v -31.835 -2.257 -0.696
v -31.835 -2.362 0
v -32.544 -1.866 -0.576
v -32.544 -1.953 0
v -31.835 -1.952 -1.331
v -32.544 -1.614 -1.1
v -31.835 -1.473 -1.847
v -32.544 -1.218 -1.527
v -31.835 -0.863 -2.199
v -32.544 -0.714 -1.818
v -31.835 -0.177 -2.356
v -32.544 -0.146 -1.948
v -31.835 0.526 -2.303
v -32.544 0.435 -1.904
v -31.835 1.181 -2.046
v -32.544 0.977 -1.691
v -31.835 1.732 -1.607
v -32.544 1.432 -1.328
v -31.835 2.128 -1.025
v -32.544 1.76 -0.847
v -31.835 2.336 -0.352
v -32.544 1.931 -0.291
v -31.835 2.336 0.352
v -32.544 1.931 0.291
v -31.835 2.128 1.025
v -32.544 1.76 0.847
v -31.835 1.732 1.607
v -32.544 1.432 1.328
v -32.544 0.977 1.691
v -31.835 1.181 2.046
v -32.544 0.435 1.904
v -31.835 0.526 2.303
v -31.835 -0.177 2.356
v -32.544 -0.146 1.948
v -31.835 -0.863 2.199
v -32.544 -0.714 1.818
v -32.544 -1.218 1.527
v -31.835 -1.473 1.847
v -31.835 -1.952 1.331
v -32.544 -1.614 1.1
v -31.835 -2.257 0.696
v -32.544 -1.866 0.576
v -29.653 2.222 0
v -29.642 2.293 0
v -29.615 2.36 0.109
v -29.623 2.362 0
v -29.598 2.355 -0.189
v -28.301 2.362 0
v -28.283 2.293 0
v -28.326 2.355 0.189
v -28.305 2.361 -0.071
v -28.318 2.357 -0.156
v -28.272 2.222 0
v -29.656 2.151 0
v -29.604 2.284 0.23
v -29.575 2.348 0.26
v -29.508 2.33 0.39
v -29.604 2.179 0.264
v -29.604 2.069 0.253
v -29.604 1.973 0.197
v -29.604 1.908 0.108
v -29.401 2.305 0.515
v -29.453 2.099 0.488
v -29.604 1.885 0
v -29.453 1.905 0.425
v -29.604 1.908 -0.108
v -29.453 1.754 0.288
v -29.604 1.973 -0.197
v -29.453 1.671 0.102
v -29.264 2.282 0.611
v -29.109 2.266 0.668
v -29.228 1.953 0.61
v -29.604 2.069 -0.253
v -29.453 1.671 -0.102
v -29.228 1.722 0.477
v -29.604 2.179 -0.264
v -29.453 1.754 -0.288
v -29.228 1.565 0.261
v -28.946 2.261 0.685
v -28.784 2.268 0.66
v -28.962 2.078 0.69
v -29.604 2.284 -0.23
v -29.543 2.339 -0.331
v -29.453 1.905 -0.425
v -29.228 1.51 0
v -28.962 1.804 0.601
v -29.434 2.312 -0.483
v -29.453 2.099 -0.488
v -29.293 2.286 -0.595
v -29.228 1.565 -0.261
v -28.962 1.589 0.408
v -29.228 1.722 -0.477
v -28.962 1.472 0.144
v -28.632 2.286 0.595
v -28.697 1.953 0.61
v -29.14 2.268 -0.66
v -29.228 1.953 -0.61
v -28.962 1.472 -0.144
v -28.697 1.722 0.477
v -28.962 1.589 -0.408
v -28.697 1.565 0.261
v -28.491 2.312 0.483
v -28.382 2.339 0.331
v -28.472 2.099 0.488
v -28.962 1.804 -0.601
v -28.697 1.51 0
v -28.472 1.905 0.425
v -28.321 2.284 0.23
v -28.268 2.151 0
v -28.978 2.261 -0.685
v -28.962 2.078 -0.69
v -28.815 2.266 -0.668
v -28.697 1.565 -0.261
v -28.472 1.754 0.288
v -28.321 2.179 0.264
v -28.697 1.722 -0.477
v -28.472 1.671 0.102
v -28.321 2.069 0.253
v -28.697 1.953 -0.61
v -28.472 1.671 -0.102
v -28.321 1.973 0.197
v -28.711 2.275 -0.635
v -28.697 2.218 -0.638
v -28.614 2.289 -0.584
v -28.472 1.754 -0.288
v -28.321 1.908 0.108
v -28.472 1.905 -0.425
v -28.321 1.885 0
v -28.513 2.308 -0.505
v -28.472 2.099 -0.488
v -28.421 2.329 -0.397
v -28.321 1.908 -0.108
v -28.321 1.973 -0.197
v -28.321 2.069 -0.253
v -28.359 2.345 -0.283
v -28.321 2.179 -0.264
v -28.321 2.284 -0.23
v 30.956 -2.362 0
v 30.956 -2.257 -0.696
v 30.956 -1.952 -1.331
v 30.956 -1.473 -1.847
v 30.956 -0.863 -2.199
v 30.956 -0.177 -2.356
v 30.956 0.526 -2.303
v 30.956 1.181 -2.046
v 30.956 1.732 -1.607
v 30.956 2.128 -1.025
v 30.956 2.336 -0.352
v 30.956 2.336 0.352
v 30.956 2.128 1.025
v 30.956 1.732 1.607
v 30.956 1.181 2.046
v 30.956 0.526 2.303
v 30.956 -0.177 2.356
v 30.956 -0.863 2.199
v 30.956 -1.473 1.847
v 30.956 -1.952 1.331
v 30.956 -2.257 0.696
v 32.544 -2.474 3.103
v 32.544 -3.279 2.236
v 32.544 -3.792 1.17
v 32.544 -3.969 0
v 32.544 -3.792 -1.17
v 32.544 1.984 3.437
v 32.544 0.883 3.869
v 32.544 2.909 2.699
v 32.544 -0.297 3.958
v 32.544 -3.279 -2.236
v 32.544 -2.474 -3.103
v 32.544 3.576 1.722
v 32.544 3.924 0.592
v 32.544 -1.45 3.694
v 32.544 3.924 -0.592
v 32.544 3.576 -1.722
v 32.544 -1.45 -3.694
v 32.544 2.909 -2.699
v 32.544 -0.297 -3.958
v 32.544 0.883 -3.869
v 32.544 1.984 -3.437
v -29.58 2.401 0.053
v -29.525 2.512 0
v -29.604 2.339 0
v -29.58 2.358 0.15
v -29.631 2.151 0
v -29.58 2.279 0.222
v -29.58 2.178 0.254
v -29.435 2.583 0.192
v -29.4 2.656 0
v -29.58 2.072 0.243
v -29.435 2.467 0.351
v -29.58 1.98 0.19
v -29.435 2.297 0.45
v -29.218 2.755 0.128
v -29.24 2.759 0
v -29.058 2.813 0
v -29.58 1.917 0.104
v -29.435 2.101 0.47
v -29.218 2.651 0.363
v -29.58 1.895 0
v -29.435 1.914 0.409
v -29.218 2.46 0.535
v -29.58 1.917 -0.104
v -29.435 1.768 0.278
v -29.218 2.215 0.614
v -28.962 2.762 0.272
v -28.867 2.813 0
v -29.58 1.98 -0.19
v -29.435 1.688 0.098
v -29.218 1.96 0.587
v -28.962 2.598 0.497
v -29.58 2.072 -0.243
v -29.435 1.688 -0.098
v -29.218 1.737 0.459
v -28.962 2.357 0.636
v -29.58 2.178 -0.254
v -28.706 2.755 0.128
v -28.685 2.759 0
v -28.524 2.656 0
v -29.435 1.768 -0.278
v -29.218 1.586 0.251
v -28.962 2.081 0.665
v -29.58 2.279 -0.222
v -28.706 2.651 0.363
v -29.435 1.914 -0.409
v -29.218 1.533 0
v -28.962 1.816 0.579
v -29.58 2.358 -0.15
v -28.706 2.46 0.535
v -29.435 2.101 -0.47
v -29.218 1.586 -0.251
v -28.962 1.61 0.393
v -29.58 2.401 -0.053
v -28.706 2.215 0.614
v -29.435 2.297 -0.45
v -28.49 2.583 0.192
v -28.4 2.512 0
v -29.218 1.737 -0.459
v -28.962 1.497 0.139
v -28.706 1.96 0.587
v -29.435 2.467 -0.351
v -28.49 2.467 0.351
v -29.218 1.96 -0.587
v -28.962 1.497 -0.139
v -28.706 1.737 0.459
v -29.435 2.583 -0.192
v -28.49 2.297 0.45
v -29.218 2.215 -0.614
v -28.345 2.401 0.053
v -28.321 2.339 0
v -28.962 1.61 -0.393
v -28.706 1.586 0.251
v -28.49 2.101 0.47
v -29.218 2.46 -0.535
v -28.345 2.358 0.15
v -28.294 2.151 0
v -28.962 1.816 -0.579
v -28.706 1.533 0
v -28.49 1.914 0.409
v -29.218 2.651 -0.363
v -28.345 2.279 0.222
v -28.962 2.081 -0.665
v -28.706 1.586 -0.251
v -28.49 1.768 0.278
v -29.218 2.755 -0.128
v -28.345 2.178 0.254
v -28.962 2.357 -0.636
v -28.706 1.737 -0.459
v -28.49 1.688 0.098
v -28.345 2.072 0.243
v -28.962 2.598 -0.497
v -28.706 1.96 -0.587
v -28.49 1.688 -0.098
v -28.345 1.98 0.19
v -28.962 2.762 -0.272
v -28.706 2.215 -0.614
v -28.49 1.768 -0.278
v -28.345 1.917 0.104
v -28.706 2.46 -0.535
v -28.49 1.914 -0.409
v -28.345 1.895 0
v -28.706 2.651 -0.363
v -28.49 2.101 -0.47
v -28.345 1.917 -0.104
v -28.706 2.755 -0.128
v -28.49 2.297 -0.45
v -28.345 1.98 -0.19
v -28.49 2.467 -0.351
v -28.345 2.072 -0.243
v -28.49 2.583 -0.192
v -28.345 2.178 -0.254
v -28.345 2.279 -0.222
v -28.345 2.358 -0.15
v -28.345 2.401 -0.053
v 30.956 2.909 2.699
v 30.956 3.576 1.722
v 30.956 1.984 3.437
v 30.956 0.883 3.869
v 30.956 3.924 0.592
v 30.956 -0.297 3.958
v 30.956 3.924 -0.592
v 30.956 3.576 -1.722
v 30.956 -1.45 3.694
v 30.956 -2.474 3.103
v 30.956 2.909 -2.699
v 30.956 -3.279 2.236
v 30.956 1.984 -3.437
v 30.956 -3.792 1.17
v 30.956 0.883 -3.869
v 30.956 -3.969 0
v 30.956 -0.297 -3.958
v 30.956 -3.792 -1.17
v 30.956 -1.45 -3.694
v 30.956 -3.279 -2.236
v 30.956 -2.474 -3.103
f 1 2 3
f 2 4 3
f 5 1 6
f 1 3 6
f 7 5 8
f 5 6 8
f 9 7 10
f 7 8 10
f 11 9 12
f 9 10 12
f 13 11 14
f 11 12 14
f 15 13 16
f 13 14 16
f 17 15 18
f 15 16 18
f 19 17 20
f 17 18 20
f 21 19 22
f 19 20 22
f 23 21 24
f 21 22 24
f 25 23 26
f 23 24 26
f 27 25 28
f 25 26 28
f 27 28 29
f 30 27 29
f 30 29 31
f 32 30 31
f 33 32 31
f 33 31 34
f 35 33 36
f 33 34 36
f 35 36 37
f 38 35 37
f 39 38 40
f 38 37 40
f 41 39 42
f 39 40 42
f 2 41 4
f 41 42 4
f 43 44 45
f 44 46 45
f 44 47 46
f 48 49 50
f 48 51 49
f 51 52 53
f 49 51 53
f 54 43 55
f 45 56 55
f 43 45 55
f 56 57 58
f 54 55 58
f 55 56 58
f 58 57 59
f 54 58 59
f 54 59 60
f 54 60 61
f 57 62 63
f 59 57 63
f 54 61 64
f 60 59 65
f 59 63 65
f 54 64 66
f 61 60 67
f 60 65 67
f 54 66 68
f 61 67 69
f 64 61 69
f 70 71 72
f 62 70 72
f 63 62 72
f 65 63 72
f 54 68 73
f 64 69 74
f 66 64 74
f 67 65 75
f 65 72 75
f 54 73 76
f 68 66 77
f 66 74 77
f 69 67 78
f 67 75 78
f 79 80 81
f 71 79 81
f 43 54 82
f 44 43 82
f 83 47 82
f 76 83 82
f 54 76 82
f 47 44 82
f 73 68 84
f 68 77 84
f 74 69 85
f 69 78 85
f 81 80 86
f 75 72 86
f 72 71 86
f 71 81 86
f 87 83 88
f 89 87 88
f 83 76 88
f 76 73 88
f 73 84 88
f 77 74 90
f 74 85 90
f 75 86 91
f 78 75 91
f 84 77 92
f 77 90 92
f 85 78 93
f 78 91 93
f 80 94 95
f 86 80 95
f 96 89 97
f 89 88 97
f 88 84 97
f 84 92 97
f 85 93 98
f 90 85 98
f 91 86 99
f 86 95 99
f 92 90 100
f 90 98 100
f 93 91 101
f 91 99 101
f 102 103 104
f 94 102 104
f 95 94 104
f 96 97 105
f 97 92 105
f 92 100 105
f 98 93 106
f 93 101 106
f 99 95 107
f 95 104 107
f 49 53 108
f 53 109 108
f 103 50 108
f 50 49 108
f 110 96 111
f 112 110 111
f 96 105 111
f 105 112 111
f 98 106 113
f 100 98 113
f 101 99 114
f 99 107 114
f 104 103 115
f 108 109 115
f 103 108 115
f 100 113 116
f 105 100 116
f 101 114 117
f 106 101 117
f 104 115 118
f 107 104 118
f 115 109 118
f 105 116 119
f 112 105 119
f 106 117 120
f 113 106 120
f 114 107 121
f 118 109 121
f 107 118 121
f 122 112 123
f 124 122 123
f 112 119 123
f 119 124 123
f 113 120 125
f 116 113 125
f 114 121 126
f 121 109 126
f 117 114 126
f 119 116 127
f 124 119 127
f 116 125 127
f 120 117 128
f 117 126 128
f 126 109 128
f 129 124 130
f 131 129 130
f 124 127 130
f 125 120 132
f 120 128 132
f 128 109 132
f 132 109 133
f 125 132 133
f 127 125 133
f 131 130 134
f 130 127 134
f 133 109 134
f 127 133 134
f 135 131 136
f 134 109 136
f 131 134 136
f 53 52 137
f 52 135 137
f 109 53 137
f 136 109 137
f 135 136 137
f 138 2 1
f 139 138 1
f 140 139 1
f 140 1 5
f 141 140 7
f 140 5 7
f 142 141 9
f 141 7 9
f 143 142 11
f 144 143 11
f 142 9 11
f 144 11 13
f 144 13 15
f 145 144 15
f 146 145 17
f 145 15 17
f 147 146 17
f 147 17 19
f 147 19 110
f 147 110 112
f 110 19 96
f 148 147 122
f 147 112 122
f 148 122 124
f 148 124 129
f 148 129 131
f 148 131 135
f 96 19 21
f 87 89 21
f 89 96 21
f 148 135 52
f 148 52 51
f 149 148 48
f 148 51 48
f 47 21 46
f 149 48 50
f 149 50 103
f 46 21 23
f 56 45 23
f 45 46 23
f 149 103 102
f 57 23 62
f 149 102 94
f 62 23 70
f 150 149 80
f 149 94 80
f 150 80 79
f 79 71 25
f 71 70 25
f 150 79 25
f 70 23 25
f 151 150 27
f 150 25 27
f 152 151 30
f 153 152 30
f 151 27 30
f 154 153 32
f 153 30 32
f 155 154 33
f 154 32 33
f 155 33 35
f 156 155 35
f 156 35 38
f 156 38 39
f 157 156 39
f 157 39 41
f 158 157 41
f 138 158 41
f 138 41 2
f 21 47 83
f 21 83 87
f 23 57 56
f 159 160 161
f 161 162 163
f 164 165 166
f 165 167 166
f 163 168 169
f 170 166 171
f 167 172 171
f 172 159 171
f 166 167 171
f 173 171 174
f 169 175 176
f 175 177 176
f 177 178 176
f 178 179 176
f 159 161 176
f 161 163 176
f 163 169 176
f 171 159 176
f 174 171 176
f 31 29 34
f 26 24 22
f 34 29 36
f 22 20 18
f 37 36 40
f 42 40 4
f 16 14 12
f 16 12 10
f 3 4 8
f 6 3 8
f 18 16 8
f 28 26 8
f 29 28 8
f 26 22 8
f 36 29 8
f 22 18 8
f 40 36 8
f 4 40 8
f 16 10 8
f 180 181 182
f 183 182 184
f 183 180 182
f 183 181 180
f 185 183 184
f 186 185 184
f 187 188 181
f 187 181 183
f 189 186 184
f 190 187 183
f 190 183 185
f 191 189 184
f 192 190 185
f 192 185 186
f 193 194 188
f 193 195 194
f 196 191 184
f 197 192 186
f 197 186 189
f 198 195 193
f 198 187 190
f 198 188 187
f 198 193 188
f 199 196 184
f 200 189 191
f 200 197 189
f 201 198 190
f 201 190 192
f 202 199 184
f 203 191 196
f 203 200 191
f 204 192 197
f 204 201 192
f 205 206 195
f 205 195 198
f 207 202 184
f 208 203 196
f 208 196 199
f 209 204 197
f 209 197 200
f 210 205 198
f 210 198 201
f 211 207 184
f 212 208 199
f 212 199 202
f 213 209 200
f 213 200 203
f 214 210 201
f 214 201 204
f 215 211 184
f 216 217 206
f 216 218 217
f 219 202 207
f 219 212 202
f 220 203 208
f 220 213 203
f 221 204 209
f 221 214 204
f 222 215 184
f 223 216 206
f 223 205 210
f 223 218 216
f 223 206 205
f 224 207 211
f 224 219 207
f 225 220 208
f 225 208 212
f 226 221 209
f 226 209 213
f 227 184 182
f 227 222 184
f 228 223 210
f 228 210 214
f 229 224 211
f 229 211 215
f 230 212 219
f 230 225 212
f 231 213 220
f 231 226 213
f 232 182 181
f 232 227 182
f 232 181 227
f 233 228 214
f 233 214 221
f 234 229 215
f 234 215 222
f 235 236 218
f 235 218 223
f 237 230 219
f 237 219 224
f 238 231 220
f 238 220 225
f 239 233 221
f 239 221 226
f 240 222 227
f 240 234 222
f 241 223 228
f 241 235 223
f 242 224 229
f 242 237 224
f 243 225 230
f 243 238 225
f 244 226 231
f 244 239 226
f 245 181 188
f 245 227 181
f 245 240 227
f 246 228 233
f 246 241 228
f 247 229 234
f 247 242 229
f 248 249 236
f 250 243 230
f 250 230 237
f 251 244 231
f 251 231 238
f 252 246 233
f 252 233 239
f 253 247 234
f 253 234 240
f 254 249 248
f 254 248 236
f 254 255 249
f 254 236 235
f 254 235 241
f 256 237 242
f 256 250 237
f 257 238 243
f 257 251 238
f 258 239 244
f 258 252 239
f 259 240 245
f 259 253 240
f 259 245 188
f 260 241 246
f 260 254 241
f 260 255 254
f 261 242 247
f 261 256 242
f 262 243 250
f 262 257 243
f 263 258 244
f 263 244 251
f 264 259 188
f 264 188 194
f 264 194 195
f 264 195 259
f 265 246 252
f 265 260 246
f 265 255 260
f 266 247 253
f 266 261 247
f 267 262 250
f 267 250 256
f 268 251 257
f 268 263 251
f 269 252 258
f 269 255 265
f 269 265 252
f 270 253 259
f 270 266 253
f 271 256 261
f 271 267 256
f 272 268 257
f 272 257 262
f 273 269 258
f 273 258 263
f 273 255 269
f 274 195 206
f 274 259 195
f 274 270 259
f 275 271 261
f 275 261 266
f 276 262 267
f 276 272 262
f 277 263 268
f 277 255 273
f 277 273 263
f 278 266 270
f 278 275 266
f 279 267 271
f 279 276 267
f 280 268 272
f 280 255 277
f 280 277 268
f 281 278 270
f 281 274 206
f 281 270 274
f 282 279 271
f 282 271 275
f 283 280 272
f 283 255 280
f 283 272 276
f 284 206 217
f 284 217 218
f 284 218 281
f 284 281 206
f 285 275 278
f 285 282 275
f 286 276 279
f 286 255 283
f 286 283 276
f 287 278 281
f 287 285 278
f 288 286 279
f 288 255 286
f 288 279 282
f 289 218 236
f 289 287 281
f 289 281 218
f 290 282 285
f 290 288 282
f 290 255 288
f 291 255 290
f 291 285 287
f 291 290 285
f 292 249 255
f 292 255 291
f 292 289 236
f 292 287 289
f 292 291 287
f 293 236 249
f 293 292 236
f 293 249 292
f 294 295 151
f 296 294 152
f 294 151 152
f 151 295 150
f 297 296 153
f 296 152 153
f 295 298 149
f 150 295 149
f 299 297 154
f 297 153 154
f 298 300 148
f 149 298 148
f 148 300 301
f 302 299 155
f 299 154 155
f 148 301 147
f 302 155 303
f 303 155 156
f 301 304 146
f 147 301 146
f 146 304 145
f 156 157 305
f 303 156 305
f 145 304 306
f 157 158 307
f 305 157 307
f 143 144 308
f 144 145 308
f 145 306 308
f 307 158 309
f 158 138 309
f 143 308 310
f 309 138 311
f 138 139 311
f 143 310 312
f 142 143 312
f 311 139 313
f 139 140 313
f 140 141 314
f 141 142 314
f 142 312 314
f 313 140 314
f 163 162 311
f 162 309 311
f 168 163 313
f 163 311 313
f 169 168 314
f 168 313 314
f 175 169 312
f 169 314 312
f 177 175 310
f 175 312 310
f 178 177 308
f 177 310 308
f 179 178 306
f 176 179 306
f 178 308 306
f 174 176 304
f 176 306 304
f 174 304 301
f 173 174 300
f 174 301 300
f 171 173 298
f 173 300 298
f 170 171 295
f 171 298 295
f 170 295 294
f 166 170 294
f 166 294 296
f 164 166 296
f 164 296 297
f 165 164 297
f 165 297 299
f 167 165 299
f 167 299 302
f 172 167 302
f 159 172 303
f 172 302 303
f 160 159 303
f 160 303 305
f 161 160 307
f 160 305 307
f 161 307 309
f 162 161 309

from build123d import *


with BuildPart() as part:
    # Sketch1 → Revolve1 (revolve)
    with BuildSketch(Plane.XY, mode=Mode.PRIVATE) as revolve1_sk:
        Polygon((32.54375, 3.96875), (30.95625, 3.96875), (30.95625, 2.3622), (-31.83509, 2.3622), (-32.54375, 1.953054958), (-32.54375, 0), (32.54375, 0), align=None)
    revolve(revolve1_sk.sketch.rotate(Axis((-32.54375, 0, 0), (1, 0, 0)), 180), axis=Axis((-32.54375, 0, 0), (1, 0, 0)))

    # Sketch2 → Cut-Revolve1 (revolve, cut)
    with BuildSketch(Plane.XY):
        with BuildLine():
            Line((-28.26832515, 2.15077515), (-29.65637485, 2.15077515))
            ThreePointArc((-29.65637485, 2.15077515), (-28.96235, 2.8448), (-28.26832515, 2.15077515))
        make_face()
    revolve(axis=Axis((-28.26832515, 2.15077515, 0), (1, 0, 0)), mode=Mode.SUBTRACT)


with BuildPart() as body_2:
    # Sketch3 → Revolve2 (revolve)
    with BuildSketch(Plane.XY):
        with BuildLine():
            Line((-28.29372515, 2.15077515), (-29.63097485, 2.15077515))
            ThreePointArc((-29.63097485, 2.15077515), (-28.96235, 2.8194), (-28.29372515, 2.15077515))
        make_face()
    revolve(axis=Axis((-28.29372515, 2.15077515, 0), (1, 0, 0)))


solid = Compound([part.part, body_2.part])
